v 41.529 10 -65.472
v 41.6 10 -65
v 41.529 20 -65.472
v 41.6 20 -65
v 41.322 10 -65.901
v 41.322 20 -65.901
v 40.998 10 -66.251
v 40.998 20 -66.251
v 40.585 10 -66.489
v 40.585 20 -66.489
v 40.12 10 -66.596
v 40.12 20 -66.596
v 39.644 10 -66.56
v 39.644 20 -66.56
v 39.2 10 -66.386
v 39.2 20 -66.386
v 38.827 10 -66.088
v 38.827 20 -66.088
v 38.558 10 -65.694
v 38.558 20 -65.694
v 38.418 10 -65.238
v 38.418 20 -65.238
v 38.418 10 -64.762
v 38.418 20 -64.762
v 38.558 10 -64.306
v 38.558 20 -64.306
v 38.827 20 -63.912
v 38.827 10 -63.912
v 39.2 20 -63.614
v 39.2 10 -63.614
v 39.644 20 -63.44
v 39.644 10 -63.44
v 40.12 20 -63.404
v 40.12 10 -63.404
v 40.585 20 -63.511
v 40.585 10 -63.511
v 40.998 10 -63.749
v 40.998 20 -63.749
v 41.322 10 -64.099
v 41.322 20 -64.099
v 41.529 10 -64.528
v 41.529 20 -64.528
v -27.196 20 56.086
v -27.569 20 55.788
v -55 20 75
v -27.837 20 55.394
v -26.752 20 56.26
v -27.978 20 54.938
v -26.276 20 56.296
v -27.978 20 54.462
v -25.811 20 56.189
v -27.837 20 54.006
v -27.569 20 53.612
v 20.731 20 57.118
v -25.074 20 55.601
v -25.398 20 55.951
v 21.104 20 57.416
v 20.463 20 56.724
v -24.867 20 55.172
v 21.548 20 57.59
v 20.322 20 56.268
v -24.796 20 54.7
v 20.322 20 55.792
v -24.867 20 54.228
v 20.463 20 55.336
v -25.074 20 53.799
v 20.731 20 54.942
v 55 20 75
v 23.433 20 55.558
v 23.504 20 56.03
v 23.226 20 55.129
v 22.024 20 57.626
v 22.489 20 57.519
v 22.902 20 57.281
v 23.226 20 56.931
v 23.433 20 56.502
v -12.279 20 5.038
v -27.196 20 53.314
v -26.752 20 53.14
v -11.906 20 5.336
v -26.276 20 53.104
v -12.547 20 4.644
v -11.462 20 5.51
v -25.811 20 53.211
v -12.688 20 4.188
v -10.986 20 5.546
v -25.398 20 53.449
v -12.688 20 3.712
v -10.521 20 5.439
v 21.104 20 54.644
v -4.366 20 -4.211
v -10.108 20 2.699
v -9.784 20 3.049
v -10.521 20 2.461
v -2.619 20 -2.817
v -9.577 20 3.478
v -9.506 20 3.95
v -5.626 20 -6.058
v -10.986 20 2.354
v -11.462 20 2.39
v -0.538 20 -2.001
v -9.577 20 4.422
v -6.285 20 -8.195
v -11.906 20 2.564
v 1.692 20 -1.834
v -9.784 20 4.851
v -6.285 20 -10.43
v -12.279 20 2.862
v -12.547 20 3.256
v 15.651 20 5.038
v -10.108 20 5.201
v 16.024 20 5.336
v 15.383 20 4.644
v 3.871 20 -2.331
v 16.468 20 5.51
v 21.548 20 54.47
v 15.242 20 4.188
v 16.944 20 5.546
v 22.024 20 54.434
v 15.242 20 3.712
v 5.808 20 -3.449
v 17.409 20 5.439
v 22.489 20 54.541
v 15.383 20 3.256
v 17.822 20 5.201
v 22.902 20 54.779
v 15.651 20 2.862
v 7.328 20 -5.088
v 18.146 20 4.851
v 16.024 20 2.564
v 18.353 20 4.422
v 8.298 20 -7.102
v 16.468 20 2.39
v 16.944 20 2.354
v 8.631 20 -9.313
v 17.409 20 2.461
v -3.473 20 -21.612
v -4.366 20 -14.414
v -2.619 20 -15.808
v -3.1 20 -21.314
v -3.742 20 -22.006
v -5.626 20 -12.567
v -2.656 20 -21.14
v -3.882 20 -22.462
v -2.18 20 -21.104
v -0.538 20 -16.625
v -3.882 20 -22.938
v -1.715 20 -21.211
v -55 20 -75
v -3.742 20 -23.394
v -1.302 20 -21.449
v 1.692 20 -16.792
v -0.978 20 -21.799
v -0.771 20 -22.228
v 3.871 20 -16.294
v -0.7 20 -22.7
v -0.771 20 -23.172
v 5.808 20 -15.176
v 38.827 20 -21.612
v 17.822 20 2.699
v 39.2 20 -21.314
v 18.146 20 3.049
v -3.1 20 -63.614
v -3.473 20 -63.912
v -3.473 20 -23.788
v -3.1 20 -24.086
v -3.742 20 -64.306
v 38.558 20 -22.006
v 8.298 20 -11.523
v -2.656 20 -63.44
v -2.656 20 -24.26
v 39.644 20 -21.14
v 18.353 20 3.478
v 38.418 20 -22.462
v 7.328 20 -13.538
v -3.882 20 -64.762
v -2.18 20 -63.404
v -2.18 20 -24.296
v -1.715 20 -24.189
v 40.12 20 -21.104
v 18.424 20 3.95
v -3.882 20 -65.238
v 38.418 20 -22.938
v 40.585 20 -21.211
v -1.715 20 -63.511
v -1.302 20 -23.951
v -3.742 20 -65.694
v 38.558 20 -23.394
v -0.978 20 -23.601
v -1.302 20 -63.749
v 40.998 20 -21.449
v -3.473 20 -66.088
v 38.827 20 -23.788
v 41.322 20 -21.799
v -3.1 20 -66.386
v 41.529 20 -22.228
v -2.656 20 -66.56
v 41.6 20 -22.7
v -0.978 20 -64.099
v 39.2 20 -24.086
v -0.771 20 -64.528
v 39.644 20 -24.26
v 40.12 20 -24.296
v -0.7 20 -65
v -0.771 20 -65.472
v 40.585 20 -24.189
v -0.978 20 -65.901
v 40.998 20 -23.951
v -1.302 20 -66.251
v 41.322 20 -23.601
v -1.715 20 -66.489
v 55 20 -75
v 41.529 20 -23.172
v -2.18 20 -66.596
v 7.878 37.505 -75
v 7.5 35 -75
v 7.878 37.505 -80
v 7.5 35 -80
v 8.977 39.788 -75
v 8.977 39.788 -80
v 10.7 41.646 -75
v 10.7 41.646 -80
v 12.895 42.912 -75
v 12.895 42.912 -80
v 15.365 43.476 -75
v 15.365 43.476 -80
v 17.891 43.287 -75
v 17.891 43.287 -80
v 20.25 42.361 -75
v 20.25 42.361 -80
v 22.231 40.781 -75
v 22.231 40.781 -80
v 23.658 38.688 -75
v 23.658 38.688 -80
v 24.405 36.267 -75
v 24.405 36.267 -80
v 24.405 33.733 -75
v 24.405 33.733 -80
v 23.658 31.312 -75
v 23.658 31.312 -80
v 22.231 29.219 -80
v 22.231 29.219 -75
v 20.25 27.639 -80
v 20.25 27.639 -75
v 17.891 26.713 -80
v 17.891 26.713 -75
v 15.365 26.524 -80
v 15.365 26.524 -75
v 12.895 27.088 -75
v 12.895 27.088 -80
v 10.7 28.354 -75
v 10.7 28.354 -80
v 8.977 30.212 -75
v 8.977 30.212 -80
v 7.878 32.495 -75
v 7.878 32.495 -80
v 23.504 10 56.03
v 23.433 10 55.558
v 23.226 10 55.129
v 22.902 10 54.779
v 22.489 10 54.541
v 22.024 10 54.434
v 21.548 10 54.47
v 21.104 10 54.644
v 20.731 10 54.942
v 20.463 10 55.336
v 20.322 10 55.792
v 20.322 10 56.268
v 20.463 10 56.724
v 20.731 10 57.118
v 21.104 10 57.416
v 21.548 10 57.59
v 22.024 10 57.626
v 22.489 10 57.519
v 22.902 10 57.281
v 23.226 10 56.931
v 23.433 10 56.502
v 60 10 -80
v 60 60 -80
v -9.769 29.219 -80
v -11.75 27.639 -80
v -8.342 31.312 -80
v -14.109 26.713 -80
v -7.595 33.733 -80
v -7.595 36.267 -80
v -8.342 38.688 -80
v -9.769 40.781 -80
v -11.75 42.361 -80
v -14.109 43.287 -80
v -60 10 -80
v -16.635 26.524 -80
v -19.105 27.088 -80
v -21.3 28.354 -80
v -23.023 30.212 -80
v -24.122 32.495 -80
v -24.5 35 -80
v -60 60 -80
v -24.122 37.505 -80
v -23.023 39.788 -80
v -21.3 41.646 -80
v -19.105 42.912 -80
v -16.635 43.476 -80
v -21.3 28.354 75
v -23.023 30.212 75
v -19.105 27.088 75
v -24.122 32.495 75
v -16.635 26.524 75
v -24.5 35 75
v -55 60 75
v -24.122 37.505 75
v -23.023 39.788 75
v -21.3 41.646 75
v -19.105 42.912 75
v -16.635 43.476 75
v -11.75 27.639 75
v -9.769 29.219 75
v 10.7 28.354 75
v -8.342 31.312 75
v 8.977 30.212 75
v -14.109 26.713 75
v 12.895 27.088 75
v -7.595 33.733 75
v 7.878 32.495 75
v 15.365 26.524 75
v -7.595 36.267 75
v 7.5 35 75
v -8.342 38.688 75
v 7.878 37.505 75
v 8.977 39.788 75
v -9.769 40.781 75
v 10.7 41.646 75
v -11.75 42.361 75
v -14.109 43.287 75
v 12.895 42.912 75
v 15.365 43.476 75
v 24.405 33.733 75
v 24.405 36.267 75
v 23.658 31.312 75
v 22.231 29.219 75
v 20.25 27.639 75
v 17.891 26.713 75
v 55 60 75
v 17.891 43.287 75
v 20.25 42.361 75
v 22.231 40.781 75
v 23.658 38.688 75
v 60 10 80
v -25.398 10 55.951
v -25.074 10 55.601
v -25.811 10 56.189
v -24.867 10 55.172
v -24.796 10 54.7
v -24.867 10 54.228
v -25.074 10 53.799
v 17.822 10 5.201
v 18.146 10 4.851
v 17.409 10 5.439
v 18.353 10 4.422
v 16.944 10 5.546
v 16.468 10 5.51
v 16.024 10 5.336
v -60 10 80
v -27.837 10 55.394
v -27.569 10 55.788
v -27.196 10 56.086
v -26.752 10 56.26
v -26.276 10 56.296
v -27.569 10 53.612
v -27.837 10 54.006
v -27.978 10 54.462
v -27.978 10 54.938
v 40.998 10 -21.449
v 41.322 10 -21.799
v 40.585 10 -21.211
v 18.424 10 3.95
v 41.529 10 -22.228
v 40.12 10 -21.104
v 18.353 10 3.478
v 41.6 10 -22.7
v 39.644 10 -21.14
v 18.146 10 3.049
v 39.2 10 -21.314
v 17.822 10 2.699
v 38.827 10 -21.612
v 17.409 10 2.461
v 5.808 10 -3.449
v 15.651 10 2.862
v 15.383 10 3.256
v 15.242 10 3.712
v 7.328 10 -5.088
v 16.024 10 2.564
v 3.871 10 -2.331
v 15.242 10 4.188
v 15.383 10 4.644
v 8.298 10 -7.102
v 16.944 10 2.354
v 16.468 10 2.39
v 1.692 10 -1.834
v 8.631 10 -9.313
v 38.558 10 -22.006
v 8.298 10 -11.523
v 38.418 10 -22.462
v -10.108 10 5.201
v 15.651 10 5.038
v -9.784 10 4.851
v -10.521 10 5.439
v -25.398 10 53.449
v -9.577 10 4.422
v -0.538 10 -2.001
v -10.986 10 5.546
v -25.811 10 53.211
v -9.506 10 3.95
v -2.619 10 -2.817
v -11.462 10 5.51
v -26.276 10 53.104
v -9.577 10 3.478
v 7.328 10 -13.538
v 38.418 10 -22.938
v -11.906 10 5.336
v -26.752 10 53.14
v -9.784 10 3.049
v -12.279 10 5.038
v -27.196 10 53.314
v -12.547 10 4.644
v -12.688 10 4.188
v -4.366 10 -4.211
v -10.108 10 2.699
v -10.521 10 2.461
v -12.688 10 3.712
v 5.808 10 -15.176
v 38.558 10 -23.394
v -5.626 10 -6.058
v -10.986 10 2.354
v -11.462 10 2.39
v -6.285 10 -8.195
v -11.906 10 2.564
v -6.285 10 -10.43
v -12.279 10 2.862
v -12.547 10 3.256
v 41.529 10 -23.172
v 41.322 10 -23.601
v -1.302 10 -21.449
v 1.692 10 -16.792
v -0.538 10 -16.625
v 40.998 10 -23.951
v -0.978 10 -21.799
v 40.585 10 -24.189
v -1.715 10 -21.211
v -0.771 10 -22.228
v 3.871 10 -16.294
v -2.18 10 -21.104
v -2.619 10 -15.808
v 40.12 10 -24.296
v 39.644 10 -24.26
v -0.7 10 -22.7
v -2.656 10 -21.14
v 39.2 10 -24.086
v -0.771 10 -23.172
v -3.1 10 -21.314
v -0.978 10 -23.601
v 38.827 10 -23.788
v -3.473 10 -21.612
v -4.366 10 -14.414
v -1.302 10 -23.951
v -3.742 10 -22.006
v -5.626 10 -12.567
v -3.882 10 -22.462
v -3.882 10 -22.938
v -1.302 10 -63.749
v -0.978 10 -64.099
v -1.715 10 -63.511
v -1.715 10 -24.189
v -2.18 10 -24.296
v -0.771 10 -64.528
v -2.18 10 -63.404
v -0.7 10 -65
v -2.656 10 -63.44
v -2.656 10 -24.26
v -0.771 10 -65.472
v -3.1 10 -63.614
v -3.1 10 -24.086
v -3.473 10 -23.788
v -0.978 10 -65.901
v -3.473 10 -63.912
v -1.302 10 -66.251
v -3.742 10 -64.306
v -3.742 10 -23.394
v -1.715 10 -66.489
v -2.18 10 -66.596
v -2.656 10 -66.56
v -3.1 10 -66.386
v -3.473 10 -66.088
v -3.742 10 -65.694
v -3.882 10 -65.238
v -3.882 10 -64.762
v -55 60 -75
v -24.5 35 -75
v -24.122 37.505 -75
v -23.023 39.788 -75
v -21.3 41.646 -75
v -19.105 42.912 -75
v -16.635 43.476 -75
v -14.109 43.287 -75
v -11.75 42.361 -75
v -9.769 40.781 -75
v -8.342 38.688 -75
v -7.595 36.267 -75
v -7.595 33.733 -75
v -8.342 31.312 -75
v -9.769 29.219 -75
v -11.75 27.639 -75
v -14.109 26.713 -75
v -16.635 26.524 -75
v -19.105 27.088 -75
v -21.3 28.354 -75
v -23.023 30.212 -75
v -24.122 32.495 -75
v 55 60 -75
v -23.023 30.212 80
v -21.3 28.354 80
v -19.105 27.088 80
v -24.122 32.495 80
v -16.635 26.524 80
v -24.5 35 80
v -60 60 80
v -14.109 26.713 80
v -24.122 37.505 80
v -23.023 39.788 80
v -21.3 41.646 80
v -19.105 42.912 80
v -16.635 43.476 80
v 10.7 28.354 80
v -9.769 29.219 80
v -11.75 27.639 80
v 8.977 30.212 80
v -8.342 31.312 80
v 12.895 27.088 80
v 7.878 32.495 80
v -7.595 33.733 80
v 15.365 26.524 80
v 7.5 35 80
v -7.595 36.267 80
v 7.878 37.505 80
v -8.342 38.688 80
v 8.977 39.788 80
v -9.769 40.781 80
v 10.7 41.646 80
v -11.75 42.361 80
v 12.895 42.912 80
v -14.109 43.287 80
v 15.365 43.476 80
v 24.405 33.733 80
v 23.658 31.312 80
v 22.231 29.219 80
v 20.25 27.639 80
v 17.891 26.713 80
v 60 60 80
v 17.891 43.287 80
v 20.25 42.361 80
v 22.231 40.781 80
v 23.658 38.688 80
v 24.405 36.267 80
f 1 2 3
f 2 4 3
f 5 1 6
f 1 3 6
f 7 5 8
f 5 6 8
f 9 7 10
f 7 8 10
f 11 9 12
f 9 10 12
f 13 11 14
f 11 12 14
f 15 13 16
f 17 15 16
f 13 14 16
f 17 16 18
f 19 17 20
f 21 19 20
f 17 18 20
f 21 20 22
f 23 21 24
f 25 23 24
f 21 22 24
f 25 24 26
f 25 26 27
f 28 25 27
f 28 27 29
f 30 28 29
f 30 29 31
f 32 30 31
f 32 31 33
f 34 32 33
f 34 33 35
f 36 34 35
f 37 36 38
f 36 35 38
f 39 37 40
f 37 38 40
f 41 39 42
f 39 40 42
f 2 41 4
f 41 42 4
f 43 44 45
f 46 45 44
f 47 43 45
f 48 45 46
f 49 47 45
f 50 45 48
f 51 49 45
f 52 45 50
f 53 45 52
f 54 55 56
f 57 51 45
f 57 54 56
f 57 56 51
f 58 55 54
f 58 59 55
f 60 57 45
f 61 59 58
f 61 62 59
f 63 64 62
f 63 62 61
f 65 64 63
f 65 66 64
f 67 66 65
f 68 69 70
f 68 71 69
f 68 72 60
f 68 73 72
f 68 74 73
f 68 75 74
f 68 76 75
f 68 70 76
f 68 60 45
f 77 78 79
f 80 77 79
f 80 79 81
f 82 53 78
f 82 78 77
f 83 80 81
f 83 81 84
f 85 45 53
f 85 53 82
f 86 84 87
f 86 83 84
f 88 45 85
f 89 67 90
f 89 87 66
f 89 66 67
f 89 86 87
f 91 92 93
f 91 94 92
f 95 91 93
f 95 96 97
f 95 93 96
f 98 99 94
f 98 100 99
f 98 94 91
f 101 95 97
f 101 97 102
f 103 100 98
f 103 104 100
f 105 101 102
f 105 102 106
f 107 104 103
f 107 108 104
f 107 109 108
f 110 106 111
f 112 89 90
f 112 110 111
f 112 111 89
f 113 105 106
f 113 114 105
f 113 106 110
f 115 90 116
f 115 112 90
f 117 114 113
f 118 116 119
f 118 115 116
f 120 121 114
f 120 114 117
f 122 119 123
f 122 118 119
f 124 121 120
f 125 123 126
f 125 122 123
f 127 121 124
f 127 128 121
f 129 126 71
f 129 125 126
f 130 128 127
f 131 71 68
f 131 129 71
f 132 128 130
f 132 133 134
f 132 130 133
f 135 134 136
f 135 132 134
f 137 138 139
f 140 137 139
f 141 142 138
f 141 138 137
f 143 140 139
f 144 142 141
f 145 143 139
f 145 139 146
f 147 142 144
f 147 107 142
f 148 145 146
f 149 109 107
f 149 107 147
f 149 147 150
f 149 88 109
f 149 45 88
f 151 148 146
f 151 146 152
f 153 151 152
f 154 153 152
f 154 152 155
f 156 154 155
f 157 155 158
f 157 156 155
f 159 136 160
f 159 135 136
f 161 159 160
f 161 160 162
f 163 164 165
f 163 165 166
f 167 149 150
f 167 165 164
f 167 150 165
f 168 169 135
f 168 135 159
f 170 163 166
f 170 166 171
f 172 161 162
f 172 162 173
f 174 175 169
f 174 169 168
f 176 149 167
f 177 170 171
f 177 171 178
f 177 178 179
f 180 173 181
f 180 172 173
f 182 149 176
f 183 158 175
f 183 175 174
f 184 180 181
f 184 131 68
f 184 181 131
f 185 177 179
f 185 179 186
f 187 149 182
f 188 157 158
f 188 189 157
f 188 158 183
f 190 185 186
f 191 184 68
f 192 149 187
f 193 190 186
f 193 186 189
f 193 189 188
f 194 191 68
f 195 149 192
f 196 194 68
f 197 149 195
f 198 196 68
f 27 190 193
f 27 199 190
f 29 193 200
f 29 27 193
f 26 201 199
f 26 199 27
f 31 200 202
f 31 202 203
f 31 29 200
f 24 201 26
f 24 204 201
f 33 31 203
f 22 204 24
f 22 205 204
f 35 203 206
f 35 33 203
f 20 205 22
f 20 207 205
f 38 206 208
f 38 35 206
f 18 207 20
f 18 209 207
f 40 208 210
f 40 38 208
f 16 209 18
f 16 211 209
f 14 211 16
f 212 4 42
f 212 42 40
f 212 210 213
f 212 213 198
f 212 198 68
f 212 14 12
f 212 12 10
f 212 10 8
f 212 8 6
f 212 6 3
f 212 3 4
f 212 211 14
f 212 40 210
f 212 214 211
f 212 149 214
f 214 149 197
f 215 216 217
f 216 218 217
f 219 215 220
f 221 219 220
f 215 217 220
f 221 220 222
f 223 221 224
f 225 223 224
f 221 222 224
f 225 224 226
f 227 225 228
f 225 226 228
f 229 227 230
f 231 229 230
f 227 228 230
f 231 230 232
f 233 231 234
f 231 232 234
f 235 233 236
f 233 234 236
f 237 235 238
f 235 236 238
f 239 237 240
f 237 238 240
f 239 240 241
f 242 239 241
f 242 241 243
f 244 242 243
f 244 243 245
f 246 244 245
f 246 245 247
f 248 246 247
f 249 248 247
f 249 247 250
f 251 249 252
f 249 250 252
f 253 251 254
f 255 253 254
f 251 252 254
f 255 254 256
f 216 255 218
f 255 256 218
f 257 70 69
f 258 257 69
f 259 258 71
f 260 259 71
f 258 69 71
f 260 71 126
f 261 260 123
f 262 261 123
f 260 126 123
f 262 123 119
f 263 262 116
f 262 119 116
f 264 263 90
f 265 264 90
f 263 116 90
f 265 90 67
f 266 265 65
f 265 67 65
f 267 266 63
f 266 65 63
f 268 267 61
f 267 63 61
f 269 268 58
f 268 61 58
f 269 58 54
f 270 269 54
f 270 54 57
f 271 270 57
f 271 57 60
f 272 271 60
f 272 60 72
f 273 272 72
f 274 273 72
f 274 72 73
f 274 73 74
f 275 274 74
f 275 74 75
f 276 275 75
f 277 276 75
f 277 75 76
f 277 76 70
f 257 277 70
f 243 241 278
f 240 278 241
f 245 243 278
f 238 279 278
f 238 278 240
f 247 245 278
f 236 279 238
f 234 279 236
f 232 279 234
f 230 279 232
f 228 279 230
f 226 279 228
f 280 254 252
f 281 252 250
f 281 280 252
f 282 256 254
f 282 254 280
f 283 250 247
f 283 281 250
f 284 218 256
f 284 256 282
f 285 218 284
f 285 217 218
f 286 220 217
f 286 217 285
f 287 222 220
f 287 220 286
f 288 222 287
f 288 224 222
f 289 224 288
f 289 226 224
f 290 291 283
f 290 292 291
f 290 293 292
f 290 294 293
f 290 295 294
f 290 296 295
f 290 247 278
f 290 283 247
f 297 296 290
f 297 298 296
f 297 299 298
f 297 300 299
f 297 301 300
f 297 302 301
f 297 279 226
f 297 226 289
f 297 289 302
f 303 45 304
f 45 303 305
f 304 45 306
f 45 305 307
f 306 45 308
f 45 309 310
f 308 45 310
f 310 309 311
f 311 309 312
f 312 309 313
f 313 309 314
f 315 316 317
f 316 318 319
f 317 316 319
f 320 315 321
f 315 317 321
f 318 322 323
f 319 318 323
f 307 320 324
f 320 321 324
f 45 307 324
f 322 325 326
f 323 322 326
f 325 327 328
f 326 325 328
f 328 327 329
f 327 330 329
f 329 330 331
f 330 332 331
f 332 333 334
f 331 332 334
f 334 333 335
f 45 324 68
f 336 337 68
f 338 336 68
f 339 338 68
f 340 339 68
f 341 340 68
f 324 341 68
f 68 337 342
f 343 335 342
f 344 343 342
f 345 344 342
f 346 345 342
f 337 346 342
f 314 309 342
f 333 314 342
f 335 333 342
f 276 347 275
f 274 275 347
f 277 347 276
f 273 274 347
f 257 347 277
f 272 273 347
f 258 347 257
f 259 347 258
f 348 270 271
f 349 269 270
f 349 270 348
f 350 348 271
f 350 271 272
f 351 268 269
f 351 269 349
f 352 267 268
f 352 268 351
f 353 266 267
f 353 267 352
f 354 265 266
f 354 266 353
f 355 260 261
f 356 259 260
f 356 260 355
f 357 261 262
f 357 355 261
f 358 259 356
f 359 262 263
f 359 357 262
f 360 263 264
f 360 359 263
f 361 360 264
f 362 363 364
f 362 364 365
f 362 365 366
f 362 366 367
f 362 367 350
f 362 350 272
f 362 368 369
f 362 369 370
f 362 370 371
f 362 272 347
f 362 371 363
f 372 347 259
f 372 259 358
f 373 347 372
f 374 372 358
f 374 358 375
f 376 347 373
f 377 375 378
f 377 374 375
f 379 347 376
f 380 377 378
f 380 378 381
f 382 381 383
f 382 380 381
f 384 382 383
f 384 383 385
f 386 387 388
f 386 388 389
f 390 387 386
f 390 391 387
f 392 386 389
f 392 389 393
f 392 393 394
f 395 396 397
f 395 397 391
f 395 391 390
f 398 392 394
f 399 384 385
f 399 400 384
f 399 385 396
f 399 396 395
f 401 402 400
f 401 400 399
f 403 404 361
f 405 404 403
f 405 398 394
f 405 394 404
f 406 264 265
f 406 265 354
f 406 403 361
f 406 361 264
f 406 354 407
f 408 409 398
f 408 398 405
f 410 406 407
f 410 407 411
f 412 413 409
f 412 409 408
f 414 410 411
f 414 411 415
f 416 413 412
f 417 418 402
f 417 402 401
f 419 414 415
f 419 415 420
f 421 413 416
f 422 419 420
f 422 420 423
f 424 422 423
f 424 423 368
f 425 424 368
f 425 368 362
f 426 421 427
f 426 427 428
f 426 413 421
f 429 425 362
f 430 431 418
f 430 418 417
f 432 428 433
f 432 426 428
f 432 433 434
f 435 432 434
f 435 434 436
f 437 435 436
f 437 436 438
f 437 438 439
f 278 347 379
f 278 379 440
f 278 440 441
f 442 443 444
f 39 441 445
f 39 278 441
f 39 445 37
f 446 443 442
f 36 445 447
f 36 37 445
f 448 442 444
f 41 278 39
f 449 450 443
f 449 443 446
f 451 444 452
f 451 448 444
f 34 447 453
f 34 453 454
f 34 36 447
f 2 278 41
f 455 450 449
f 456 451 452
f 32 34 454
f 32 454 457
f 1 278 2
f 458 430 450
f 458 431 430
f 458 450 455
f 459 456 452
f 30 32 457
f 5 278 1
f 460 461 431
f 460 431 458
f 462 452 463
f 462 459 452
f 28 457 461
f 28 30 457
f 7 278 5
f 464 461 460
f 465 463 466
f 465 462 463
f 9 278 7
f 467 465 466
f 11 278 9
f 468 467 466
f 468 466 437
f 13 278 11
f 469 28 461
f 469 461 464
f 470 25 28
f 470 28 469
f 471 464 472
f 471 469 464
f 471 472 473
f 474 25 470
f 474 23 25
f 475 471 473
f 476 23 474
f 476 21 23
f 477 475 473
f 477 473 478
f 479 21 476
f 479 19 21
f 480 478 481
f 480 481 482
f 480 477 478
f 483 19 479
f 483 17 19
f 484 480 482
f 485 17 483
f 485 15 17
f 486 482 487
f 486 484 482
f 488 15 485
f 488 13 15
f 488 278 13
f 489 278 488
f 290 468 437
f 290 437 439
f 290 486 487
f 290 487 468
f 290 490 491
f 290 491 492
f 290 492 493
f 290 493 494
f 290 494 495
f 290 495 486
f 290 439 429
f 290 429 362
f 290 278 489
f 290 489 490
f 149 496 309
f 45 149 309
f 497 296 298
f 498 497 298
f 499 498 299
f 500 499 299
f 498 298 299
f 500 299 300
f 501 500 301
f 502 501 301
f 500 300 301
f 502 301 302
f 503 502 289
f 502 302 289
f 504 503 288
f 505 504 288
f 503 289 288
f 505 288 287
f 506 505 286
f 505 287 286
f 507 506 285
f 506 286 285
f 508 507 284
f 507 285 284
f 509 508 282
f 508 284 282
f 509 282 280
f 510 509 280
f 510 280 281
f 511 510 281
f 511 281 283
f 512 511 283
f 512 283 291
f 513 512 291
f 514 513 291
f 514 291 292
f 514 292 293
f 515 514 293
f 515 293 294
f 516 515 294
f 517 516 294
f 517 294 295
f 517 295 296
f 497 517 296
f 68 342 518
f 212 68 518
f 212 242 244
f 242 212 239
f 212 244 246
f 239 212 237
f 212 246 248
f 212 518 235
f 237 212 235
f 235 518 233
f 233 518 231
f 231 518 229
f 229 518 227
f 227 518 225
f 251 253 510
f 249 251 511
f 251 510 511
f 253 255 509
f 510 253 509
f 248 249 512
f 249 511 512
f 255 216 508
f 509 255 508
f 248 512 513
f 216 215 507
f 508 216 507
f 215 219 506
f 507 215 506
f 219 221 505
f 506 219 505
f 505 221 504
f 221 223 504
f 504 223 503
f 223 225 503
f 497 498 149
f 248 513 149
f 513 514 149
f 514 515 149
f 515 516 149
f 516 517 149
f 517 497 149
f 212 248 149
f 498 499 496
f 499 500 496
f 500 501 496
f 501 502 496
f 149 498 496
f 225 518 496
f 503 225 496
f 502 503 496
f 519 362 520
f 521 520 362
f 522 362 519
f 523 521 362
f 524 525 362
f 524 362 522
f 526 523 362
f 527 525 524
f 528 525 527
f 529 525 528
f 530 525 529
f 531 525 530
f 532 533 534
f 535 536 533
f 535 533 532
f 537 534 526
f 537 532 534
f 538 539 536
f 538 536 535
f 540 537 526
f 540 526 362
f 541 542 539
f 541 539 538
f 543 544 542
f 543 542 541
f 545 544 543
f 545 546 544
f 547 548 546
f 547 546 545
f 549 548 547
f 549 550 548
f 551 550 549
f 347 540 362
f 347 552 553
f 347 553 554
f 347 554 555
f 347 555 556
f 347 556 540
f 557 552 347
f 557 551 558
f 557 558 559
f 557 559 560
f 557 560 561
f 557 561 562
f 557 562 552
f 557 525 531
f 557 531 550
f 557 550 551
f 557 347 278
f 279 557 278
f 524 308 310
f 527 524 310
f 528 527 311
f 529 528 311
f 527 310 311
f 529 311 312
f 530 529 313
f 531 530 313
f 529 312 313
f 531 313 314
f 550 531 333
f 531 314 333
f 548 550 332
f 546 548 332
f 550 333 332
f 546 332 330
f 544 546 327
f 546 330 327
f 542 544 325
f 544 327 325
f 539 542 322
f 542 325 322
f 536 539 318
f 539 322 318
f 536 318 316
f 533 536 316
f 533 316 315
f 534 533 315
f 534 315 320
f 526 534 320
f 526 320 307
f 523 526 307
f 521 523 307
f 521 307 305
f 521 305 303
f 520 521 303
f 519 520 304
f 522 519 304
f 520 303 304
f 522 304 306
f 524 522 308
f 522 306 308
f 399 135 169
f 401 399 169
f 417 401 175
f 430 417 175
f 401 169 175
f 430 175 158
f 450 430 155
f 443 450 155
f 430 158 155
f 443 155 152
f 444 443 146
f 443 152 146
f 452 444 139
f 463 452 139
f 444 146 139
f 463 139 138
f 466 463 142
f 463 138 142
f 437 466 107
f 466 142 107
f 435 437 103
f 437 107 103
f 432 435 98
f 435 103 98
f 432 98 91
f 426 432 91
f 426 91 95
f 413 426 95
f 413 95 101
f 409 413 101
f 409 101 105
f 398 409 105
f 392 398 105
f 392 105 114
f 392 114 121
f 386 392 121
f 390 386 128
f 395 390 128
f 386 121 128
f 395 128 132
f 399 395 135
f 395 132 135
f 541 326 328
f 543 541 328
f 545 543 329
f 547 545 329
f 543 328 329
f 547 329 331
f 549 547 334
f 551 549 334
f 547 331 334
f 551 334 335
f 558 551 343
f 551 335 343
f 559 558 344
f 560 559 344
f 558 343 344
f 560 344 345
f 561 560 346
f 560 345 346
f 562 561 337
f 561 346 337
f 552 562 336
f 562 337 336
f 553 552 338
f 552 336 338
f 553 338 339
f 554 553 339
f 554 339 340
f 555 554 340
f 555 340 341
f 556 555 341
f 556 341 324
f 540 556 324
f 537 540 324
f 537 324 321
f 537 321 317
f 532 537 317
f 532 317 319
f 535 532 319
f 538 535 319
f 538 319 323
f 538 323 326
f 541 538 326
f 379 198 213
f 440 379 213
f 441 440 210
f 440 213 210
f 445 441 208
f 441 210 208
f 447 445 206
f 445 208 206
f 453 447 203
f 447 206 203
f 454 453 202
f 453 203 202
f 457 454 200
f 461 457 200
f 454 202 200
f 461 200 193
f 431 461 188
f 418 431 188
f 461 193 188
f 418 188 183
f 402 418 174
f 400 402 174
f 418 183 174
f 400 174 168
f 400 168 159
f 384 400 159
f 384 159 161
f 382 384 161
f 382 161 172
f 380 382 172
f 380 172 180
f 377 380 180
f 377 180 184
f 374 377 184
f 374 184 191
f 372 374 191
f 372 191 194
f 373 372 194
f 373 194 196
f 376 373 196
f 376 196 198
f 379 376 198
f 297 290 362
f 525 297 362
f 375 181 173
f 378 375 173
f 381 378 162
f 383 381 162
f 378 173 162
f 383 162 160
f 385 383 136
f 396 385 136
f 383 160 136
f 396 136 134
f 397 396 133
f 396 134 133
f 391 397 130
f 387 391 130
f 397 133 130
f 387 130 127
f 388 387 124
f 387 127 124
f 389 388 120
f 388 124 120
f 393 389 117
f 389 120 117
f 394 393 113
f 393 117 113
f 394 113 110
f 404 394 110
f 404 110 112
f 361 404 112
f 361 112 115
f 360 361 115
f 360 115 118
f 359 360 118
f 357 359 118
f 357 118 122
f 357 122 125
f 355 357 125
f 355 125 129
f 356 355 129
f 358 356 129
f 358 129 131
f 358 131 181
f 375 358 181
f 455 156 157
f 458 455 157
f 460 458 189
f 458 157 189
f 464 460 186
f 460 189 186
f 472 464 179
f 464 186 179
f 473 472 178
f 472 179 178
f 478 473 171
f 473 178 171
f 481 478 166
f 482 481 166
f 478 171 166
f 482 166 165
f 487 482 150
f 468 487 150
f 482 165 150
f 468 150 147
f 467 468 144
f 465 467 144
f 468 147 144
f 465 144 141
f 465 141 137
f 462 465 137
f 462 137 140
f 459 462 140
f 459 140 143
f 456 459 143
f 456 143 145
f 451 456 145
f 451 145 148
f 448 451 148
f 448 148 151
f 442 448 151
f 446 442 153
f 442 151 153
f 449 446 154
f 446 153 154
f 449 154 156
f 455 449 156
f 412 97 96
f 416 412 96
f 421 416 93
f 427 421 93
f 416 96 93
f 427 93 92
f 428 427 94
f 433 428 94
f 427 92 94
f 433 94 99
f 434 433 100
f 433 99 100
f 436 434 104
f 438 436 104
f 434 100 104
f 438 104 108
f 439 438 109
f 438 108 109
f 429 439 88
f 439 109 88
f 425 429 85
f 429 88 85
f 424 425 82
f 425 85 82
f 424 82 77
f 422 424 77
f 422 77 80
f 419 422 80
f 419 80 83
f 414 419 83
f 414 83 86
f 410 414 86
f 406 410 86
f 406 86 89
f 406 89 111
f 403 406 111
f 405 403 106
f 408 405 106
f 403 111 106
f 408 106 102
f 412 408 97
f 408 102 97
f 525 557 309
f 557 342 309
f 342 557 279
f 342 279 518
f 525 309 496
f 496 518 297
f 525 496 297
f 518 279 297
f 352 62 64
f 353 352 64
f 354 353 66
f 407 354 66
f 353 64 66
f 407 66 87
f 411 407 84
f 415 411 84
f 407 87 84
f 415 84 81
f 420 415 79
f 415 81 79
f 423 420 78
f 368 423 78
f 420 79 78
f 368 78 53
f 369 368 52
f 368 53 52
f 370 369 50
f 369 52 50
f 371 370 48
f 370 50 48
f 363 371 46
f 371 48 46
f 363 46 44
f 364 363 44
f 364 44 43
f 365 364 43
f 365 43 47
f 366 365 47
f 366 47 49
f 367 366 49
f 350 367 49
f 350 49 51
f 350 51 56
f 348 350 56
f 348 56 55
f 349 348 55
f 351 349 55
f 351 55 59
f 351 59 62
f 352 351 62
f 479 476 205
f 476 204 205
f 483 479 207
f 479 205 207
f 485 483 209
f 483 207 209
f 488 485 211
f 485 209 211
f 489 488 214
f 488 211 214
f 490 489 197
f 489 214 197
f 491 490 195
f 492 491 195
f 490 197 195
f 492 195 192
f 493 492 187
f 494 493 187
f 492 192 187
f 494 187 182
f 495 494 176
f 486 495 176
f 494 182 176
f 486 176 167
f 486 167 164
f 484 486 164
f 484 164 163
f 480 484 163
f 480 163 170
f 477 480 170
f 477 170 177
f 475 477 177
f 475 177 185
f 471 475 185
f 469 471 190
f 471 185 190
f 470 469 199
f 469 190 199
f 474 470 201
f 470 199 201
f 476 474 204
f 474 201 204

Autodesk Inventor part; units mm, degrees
ref_plane "YZ Plane" through (0, 0, 0) normal (1, 0, 0) x (0, 1, 0)
ref_plane "XZ Plane" through (0, 0, 0) normal (0, 1, 0) x (-1, 0, 0)
ref_plane "XY Plane" through (0, 0, 0) normal (0, 0, 1) x (1, 0, 0)
sketch "스케치1" plane through (0, 0, 0) normal (0, 1, 0) x (-1, 0, 0)
  line L0 (60, 80) -> (-60, 80)
  line L1 (-60, 80) -> (-60, -80)
  line L2 (-60, -80) -> (60, -80)
  line L3 (60, -80) -> (60, 80)
  line L4 (60, 80) -> (-60, -80) construction
  line L5 (-60, 80) -> (60, -80) construction
  point P0 (0, 0)
  dimension "d0" = 120
  dimension "d1" = 160
extrude "돌출1" add sketch "스케치1" along normal blind 60
sketch "스케치2" plane through (0, 60, 0) normal (0, 1, 0) x (1, 0, 0)
  line L0 (60, -80) -> (60, 80) projected
  line L1 (60, 80) -> (-60, 80) projected
  line L2 (55, 102.1646) -> (-55, 102.1646)
  line L3 (-55, 102.1646) -> (-55, -89.711)
  line L4 (-55, -89.711) -> (55, -89.711)
  line L5 (55, -89.711) -> (55, 102.1646)
  line L6 (-60, 80) -> (-60, -80) projected
  point P0 (0, 0)
  point P1 (55, 80)
  point P2 (-55, 80)
  dimension "d6" = 5
  dimension "d7" = 5
extrude "돌출2" cut sketch "스케치2" against normal blind 40 contours L5 L4 L3 L1
sketch "스케치9" plane through (0, 20, 0) normal (0, 1, 0) x (1, 0, 0)
  line L0 (-28.9457, -70) -> (24.4543, -70)
  line L1 (24.4543, -70) -> (24.4543, -1.4)
  line L2 (24.4543, -1.4) -> (-28.9457, -1.4)
  line L3 (-28.9457, -1.4) -> (-28.9457, -70)
  line L4 (55, -80) -> (-55, -80) projected
  circle A0 centre (-26.3957, -54.7) radius 1.6
  circle A1 centre (21.9043, -56.03) radius 1.6
  circle A2 centre (16.8243, -3.95) radius 1.6
  circle A3 centre (-11.1057, -3.95) radius 1.6
  point P0 (0, 0)
  dimension "d42" = 53.4
  dimension "d43" = 68.6
  dimension "d44" = 10
  dimension "d45" = 3.2
  dimension "d46" = 15.3
  dimension "d47" = 2.55
  dimension "d51" = 3.2
  dimension "d52" = 2.55
  dimension "d56" = 13.97
  dimension "d57" = 3.2
  dimension "d58" = 7.63
  dimension "d59" = 2.55
  dimension "d60" = 3.2
  dimension "d61" = 2.55
  dimension "d62" = 35.56
extrude "돌출8" cut sketch "스케치9" against normal through all contours A0 | A1 | A2 | A3
sketch "스케치12" plane through (60, 0, -80) normal (0, 0, -1) x (-1, 0, 0)
  line L0 (-34.8463, 10) -> (156.2634, 10)
  line L1 (156.2634, 10) -> (156.2634, -36.9465)
  line L2 (156.2634, -36.9465) -> (-34.8463, -36.9465)
  line L3 (-34.8463, -36.9465) -> (-34.8463, 10)
  line L4 (0, 0) -> (120, 0) projected
  point P0 (60, 0)
  dimension "d85" = 10
extrude "돌출10" cut sketch "스케치12" against normal through all
sketch "스케치13" plane through (-55, 20, 80) normal (0, 0, 1) x (1, 0, 0)
  line L0 (0, 40) -> (0, 0) projected
  line L1 (0, 0) -> (110, 0) projected
  line L2 (0, 40) -> (110, 40)
  line L3 (110, 40) -> (110, 0)
  line L4 (110, 0) -> (0, 0)
  line L5 (0, 0) -> (0, 40)
  point P0 (55, -20)
extrude "돌출11" add sketch "스케치13" against normal blind 5
sketch "스케치14" plane through (55, 20, -80) normal (0, 0, -1) x (-1, 0, 0)
  line L0 (0, 0) -> (0, 40) projected
  line L1 (110, 0) -> (0, 0) projected
  line L2 (0, 40) -> (110, 40)
  line L3 (110, 40) -> (110, 0)
  line L4 (110, 0) -> (0, 0)
  line L5 (0, 0) -> (0, 40)
  point P0 (55, -20)
extrude "돌출12" add sketch "스케치14" against normal blind 5
sketch "스케치15" plane through (60, 60, -80) normal (0, 0, -1) x (-1, 0, 0)
  point P0 (60, -60)
sketch "스케치16" plane through (60, 60, -80) normal (0, 0, -1) x (-1, 0, 0)
  point P0 (60, -60)
sketch "스케치17" plane through (0, 20, 0) normal (0, 1, 0) x (1, 0, 0)
  line L0 (-2.3, 22.7) -> (40, 22.7)
  line L1 (40, 22.7) -> (40, 65)
  line L2 (40, 65) -> (-2.3, 65)
  line L3 (-2.3, 65) -> (-2.3, 22.7)
  line L4 (55, 75) -> (55, -75) projected
  line L5 (55, 75) -> (-55, 75) projected
  circle A0 centre (-2.3, 22.7) radius 1.6
  circle A1 centre (-2.3, 65) radius 1.6
  circle A2 centre (40, 65) radius 1.6
  circle A3 centre (40, 22.7) radius 1.6
  line L6 (-47.9371, 14.7215) -> (-7.9371, 14.7215)
  line L7 (-7.9371, 14.7215) -> (-7.9371, 64.7215)
  line L8 (-7.9371, 64.7215) -> (-47.9371, 64.7215)
  line L9 (-47.9371, 64.7215) -> (-47.9371, 14.7215)
  point P0 (0, 0)
  dimension "d92" = 42.3
  dimension "d93" = 42.3
  dimension "d95" = 15
  dimension "d96" = 10
  dimension "d97" = 3.2
  dimension "d98" = 3.2
  dimension "d99" = 3.2
  dimension "d100" = 3.2
  dimension "d113" = 40
  dimension "d114" = 50
extrude "돌출13" cut sketch "스케치17" against normal through all contours L3 A0 L0 | L0 A0 L3 | A3 L1 L0 | L0 L1 A3 | A1 L2 L3 | L3 L2 A1 | A2 L2 L1 | L1 L2 A2
sketch "스케치19" plane through (60, 60, -80) normal (0, 0, -1) x (-1, 0, 0)
  line L0 (5, -40) -> (115, -40) projected
  circle A0 centre (44, -25) radius 8.5
  circle A1 centre (76, -25) radius 8.5
  line L1 (5, 0) -> (5, -40) projected
  line L2 (115, -40) -> (115, 0) projected
  point P0 (60, -60)
  dimension "d105" = 32
  dimension "d106" = 39
  dimension "d107" = 17
  dimension "d108" = 17
  dimension "d109" = 15
  dimension "d110" = 15
extrude "돌출14" cut sketch "스케치19" against normal through all
sketch "스케치21" plane through (0, 20, 0) normal (0, 1, 0) x (1, 0, 0)
  circle A0 centre (1.1314, 9.3126) radius 7.5
  line L0 (-49.3888, 17.2731) -> (-9.3888, 17.2731)
  line L1 (-9.3888, 17.2731) -> (-9.3888, 67.2731)
  line L2 (-9.3888, 67.2731) -> (-49.3888, 67.2731)
  line L3 (-49.3888, 67.2731) -> (-49.3888, 17.2731)
  point P0 (0, 0)
  dimension "d117" = 15
  dimension "d118" = 50
  dimension "d119" = 40
extrude "돌출15" cut sketch "스케치21" against normal through all contours A0
properties part number "본체판"
